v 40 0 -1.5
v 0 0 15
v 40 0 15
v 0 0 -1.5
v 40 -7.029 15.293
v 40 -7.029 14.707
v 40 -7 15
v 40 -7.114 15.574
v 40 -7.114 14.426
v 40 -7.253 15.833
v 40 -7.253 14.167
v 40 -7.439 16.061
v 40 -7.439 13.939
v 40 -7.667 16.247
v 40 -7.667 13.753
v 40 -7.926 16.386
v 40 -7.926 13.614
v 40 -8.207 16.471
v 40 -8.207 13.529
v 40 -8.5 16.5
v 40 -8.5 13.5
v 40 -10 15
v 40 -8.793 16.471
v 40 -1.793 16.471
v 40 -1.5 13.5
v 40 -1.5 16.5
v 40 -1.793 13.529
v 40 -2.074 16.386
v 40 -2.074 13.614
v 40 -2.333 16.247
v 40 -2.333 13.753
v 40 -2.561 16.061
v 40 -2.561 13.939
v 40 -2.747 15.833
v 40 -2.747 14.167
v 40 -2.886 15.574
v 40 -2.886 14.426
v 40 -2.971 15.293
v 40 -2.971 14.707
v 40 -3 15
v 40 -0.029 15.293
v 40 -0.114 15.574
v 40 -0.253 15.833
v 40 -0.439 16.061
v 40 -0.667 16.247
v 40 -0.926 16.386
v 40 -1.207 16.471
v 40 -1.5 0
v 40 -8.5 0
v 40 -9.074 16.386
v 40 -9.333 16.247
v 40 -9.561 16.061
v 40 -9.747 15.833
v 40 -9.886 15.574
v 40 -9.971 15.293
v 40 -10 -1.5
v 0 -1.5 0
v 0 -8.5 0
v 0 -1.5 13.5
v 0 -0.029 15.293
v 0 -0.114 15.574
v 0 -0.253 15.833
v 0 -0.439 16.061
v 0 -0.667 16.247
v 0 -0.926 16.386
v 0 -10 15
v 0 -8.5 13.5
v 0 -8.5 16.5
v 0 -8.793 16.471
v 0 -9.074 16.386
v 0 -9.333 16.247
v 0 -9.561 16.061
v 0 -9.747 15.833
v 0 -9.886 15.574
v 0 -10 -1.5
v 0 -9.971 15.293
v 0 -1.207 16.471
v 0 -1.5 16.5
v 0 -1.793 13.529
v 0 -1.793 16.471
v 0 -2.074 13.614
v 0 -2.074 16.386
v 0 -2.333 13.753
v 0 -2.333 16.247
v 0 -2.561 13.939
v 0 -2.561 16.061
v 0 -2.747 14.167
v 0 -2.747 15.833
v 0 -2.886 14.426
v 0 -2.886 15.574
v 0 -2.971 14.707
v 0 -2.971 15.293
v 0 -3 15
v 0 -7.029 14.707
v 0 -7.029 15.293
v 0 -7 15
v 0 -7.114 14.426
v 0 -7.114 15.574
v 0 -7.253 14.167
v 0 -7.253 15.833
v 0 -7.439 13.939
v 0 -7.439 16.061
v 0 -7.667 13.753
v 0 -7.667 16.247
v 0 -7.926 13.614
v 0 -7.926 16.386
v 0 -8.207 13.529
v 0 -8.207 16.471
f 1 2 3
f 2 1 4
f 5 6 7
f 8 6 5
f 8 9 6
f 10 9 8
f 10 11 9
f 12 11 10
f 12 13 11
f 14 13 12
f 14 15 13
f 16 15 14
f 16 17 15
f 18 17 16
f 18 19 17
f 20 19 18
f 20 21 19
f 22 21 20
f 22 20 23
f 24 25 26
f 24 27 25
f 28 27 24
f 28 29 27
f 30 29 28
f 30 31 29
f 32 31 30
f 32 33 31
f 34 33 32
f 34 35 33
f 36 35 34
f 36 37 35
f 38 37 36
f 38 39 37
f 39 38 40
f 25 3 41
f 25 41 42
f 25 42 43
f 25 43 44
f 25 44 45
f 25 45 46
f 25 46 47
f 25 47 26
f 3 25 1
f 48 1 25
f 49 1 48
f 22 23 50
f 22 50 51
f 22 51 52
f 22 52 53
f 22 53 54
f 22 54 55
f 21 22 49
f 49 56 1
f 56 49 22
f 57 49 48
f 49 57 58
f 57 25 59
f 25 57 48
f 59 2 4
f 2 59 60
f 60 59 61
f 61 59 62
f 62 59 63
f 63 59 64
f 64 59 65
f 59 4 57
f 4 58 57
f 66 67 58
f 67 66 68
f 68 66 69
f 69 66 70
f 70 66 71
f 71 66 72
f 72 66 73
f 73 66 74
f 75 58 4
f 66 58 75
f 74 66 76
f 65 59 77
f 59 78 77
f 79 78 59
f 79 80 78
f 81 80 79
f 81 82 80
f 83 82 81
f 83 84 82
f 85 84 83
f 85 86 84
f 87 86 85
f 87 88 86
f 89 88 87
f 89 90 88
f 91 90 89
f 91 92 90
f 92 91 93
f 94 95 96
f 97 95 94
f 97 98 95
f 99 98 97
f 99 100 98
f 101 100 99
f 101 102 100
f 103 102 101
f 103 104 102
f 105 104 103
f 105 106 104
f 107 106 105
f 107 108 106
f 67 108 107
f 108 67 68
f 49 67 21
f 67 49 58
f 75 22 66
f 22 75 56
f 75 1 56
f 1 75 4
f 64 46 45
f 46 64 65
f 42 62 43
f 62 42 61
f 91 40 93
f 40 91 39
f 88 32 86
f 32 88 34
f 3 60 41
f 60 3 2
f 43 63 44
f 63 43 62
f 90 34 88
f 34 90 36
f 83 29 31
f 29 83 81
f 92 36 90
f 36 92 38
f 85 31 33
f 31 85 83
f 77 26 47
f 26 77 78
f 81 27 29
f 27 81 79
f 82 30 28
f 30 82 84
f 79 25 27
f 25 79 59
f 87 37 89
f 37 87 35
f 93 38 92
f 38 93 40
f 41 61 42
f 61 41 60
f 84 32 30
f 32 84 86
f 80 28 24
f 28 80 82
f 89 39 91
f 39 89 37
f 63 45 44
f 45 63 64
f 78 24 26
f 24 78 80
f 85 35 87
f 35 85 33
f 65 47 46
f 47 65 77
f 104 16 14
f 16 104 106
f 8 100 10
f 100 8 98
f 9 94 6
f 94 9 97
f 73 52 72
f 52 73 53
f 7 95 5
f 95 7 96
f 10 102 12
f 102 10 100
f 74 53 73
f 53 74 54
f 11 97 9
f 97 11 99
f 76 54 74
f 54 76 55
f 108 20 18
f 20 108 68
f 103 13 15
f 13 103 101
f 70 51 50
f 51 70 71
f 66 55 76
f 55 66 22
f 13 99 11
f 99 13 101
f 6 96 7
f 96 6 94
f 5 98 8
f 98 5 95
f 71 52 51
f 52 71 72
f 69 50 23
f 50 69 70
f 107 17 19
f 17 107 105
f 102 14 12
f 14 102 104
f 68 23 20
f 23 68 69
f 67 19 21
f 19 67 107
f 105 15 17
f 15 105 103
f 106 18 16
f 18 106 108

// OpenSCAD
innerWidth = 7; // The distance between the sides minus the rounded edges
thickness = 1.5;  // The thickness of a single wall (the bottom is double)
height = 15;  // The distance from the flat side to the rounded edges
width = 40;  // the width of the rounded edges
$fn = 32;  // Useful for getting the rounding right

module side() {
  linear_extrude(height = thickness) {
      polygon([[0, 0], [0, height], [width, height], [width, 0]]);
  }
}

module bottom() {
  linear_extrude(height = thickness) {
      polygon([[0, 0], [0, innerWidth + (thickness*2)], [width, innerWidth + (thickness*2)], [width, 0]]);
  }
}

module roundedEdge() {
    rotate([0, 90, 0]) {
      cylinder(width, thickness, thickness);
    }
}

rotate([90, 0, 0]) {
    side();
    translate([0, 0, innerWidth + thickness]) side();
    rotate([90, 0, 0]) {
        bottom();
    }
    translate([0, height, thickness]) {
        roundedEdge();
    }
    translate([0, height, thickness + innerWidth]) {
        roundedEdge();
    }   
}
